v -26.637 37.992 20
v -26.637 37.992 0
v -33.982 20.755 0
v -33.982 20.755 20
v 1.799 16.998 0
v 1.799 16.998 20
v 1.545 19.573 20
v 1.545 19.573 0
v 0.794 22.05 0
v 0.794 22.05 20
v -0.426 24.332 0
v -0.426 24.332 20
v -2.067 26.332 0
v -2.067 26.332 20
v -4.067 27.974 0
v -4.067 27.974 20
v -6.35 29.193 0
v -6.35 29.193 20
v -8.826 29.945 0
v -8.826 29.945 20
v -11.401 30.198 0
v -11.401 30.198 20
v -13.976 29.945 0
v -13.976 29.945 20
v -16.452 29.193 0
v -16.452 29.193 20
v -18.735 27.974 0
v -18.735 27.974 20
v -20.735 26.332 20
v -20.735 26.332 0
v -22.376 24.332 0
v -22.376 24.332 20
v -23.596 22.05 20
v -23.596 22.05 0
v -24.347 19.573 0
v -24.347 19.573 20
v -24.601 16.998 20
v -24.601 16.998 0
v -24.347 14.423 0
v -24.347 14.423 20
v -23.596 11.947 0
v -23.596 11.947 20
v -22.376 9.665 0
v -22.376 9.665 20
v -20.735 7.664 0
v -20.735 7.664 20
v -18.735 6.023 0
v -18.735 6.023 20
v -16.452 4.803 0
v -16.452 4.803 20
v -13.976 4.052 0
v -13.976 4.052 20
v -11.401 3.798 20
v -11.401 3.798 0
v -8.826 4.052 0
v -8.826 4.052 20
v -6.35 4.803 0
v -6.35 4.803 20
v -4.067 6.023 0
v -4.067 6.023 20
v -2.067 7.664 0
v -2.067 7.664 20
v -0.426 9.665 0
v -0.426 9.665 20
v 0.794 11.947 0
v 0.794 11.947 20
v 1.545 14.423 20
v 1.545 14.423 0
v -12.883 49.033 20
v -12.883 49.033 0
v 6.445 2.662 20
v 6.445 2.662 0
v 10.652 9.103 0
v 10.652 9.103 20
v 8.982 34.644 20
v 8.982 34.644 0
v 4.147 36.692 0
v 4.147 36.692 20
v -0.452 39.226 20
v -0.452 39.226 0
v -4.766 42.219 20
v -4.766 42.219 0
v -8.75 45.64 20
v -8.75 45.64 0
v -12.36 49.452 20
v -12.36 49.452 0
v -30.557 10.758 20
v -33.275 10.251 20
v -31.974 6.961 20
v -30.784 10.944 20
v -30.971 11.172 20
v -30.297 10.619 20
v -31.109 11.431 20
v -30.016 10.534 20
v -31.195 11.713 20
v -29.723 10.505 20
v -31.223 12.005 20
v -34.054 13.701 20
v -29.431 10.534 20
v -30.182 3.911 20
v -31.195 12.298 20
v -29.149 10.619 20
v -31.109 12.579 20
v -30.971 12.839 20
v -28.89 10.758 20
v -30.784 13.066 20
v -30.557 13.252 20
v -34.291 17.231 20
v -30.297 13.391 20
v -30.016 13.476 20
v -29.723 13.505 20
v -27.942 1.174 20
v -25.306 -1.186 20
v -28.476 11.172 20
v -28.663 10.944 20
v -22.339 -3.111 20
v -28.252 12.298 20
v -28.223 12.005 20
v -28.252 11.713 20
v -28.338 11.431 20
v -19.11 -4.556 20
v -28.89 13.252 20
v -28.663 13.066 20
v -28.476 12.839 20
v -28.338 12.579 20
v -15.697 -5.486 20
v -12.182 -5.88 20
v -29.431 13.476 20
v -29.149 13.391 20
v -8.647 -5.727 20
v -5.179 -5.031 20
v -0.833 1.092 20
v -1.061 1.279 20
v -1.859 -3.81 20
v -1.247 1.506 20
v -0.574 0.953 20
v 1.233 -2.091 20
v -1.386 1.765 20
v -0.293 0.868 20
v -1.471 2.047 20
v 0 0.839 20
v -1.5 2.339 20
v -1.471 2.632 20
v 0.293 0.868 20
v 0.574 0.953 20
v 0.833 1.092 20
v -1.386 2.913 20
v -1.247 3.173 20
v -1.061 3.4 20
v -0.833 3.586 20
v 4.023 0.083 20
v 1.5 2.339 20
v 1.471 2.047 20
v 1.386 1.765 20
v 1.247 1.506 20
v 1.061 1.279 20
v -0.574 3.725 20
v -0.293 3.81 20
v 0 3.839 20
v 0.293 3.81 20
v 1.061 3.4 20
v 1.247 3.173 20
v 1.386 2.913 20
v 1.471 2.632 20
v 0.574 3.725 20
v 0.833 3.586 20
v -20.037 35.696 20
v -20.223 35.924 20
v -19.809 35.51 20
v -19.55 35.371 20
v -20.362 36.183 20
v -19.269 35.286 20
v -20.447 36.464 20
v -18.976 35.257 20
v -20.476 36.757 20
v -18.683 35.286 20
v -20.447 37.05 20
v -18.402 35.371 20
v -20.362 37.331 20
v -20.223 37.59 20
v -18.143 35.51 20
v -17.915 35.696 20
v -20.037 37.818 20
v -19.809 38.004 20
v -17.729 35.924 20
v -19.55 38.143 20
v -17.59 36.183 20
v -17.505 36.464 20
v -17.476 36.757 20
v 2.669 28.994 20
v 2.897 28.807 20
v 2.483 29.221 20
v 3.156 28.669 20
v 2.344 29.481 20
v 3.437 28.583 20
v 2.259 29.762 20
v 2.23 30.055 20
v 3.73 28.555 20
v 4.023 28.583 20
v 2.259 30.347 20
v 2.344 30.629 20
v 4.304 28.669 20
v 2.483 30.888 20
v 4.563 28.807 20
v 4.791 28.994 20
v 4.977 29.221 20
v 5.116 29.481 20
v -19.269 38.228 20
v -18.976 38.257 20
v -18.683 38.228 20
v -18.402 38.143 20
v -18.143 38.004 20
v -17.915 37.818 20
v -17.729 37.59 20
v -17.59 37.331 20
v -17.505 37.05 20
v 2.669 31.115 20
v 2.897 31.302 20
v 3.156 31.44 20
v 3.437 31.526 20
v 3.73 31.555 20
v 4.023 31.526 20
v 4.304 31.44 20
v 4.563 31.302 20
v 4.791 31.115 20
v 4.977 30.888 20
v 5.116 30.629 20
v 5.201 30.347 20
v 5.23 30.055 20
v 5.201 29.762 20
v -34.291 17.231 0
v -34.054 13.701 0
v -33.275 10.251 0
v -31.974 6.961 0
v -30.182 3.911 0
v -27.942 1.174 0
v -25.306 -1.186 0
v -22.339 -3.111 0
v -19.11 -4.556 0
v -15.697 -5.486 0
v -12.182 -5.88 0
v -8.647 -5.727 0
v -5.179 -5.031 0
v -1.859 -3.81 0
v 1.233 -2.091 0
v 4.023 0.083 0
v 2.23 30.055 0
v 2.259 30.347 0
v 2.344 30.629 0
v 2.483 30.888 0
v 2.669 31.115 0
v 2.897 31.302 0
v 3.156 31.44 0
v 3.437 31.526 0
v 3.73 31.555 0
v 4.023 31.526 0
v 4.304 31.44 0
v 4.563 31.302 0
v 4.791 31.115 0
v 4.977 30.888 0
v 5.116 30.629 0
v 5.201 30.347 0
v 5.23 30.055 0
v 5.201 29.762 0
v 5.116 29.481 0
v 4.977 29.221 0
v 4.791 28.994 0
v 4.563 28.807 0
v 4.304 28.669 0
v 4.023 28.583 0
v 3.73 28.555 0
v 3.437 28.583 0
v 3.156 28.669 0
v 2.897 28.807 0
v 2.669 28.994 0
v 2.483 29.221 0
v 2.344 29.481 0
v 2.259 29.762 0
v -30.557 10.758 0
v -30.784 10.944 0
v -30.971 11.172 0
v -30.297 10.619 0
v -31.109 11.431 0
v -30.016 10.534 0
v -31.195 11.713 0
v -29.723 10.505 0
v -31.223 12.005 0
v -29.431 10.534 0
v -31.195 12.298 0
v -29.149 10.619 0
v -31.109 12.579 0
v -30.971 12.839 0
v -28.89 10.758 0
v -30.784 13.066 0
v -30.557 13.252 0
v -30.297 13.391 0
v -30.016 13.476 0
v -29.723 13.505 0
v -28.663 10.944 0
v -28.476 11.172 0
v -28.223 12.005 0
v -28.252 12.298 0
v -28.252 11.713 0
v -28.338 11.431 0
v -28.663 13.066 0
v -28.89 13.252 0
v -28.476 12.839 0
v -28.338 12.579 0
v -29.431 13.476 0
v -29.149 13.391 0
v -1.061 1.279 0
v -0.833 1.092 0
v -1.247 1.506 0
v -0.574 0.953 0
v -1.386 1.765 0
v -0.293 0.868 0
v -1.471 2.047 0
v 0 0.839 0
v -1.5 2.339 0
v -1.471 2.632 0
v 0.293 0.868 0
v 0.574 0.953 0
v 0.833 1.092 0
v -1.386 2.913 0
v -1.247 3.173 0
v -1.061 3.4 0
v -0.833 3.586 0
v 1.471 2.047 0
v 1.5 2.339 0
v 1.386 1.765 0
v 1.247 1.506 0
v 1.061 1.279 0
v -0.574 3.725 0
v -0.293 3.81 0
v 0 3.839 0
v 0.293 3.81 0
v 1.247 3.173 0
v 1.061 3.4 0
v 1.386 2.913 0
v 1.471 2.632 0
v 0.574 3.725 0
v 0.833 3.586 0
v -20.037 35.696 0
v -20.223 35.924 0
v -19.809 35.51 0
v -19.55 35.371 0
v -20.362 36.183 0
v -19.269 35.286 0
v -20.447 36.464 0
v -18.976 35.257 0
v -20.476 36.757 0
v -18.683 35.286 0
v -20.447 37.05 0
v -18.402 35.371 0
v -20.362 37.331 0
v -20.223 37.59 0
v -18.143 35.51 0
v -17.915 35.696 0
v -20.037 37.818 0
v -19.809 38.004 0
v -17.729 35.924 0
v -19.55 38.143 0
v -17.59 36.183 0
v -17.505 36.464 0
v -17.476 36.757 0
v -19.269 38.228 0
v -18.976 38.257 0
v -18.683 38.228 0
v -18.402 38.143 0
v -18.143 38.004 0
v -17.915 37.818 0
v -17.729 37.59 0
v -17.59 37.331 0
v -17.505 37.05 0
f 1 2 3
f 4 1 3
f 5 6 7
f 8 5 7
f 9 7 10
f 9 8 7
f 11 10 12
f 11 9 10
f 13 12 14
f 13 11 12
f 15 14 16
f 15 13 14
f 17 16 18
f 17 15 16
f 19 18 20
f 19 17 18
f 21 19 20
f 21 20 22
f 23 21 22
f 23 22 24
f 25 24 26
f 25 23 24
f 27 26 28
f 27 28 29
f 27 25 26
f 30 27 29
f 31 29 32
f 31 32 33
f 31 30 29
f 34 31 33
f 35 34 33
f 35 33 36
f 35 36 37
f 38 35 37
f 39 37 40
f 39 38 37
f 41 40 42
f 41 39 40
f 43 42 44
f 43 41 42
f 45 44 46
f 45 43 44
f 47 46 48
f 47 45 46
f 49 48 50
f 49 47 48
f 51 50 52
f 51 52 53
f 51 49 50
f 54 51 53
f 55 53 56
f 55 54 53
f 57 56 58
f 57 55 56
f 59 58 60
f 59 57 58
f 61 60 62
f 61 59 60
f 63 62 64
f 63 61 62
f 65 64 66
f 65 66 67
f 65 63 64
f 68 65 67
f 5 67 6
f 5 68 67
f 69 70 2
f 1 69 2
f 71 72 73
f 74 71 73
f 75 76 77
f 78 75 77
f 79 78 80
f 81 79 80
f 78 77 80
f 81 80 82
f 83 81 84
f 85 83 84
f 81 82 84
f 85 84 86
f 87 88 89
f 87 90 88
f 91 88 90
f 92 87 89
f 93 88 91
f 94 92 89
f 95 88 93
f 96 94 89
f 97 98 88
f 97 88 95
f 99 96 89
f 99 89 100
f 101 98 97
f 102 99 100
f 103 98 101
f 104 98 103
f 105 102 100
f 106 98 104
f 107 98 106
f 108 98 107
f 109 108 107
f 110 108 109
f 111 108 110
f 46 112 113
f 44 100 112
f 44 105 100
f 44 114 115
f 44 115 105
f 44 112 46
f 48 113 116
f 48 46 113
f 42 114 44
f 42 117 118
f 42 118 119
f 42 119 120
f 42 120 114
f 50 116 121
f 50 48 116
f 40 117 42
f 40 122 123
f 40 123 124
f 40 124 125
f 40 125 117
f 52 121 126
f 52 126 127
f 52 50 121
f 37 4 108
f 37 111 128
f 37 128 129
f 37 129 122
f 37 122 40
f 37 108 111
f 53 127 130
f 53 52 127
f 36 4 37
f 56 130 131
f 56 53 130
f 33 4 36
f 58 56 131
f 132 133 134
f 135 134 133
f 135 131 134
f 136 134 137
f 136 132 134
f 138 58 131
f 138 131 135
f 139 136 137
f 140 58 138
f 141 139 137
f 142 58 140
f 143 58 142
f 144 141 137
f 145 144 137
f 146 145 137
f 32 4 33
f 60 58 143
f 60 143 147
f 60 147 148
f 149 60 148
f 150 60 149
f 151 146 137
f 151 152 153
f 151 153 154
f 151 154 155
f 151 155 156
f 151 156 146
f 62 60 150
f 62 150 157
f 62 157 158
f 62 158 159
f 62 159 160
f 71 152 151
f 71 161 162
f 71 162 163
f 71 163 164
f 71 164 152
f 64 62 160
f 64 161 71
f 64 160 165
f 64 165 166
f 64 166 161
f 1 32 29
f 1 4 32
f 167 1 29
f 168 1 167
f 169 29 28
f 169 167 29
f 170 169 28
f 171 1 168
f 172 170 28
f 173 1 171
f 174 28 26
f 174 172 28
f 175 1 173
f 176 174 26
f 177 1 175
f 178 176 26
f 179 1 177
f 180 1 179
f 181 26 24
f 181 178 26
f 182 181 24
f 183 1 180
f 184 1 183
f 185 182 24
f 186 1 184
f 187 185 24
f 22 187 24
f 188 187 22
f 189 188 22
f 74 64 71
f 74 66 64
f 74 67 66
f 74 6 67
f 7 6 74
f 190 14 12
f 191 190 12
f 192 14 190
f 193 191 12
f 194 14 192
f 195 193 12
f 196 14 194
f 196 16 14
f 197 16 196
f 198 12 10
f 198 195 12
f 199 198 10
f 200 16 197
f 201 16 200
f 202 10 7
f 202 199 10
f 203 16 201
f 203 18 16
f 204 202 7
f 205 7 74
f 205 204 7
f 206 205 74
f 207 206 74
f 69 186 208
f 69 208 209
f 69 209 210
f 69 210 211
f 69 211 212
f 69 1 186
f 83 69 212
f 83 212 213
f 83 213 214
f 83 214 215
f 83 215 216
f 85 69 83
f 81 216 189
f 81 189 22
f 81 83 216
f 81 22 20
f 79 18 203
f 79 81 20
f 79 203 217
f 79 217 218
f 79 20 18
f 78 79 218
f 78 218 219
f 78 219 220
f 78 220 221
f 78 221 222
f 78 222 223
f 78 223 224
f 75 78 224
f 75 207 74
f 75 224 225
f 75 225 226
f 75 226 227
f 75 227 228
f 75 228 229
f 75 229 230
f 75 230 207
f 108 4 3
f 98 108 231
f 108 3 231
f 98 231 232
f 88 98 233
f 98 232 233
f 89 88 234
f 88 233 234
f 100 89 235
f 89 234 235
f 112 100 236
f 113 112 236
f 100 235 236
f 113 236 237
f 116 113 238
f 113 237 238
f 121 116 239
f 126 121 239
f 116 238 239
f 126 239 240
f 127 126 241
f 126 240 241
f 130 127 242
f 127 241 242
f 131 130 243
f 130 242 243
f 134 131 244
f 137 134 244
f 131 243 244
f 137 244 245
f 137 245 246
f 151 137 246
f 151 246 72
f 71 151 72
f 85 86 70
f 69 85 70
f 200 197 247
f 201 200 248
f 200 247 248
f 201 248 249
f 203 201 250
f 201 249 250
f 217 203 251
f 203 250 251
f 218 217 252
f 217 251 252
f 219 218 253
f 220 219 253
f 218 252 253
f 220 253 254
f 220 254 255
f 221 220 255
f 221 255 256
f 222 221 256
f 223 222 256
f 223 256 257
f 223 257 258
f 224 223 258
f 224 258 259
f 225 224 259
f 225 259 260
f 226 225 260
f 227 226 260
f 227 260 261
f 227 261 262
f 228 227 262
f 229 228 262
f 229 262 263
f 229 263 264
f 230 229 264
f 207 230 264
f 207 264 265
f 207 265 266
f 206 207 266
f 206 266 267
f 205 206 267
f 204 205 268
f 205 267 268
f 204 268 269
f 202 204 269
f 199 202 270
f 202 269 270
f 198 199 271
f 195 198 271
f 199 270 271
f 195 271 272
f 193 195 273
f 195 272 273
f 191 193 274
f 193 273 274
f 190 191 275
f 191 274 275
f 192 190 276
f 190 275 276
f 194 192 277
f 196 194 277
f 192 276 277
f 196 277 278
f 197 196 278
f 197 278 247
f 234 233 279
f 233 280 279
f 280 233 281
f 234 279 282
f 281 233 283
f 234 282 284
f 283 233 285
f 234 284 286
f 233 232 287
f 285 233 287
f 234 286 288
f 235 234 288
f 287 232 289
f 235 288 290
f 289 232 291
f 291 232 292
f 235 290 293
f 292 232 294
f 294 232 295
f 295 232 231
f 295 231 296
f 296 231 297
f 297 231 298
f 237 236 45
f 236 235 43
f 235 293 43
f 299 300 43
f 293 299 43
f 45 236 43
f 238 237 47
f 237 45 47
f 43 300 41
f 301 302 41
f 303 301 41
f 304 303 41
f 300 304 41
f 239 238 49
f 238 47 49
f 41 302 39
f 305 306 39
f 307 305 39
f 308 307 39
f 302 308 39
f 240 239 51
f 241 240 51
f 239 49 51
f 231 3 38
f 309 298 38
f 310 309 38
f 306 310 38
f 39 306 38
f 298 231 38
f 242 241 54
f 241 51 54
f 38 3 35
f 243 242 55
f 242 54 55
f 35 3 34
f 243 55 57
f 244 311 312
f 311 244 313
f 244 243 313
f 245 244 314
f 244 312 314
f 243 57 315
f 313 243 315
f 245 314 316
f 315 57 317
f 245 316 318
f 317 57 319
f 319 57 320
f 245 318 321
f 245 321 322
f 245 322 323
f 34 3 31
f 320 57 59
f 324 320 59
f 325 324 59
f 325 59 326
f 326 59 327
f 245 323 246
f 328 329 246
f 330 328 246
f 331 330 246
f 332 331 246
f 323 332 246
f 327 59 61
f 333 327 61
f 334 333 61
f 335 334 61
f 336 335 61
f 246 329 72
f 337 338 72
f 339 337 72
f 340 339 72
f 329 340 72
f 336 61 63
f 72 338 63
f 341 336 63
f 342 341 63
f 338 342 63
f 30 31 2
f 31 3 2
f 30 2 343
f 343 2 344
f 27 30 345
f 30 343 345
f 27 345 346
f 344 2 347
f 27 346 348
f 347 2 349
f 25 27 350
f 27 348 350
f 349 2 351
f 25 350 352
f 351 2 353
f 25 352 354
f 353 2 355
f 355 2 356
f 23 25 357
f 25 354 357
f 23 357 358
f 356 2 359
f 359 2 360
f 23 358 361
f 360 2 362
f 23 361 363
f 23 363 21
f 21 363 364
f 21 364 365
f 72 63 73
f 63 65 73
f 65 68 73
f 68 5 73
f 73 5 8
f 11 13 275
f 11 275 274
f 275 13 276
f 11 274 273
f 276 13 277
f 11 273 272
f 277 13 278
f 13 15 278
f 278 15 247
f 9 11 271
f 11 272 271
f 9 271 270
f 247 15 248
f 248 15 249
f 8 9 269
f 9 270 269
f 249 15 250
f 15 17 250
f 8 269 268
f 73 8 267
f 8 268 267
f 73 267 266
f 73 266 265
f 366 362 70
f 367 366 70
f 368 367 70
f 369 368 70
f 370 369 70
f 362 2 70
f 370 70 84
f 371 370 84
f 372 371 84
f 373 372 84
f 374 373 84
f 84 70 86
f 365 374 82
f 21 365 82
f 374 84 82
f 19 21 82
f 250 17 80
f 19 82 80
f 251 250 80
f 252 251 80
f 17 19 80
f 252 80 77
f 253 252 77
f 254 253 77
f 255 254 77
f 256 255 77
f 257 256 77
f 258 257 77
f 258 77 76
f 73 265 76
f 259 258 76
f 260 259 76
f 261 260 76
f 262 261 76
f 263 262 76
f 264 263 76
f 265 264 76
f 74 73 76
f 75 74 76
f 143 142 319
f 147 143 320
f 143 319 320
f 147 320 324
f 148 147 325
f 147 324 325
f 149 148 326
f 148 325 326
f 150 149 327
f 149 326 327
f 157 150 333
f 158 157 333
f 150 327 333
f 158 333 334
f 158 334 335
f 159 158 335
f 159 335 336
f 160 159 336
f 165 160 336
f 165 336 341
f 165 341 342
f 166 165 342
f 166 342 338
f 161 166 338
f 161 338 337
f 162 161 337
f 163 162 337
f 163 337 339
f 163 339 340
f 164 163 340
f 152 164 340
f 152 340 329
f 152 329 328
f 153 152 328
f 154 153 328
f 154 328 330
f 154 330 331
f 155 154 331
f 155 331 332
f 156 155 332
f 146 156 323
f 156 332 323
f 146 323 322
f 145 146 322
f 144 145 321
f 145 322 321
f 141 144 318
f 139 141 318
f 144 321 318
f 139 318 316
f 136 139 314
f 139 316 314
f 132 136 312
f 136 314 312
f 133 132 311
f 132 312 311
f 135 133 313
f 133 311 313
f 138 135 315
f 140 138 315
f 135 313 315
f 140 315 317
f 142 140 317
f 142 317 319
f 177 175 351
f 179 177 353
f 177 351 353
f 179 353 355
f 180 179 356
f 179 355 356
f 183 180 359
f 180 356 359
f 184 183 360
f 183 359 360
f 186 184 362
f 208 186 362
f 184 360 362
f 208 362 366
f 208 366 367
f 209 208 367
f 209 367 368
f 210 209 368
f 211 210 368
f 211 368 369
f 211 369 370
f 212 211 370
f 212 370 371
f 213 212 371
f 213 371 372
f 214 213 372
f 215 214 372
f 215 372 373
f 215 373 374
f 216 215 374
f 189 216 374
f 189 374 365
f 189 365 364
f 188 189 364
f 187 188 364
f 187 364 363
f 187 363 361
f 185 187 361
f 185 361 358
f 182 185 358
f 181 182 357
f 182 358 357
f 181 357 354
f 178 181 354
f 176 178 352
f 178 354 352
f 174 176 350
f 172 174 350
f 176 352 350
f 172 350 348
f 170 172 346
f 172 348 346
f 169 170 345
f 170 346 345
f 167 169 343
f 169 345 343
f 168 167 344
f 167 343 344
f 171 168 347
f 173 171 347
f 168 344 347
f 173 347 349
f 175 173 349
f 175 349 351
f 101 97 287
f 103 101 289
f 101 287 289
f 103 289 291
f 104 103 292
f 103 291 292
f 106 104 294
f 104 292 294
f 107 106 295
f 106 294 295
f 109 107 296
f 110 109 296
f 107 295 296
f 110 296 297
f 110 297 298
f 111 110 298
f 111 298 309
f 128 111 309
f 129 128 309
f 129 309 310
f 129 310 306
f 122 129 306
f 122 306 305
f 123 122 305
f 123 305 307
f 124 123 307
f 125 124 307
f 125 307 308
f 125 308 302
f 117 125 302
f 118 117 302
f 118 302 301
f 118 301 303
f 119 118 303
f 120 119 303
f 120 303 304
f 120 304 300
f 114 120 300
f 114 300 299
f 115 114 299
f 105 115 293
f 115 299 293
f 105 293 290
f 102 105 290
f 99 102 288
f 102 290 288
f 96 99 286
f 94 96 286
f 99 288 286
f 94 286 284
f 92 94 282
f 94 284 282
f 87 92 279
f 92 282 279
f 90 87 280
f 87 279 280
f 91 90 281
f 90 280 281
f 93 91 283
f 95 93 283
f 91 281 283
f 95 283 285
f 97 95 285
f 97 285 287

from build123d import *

# Parameters (mm, degrees)
SKETCH_1_R         = 13.2
EXTRUDE_1_DEPTH    = 20
SKETCH1_R          = 1.5
CUT_EXTRUDE1_DEPTH = 64.415064914


with BuildPart() as part:
    # 草图1 → 凸台-拉伸1 (new body)
    with BuildSketch(Plane.XY):
        with BuildLine():
            Line((-26.636659375, 37.991533435), (-33.982028451, 20.754703285))
            ThreePointArc((-33.982028451, 20.754703285), (-20.752268235, -3.895931787), (6.444792613, 2.661525501))
            Line((6.444792613, 2.661525501), (10.6520193, 9.103214753))
            Line((10.6520193, 9.103214753), (8.9820702, 34.644311807))
            ThreePointArc((8.9820702, 34.644311807), (-2.647754906, 40.666580897), (-12.360428284, 49.452053726))
            Line((-12.360428284, 49.452053726), (-12.882509975, 49.032942563))
            Line((-12.882509975, 49.032942563), (-26.636659375, 37.991533435))
        make_face()
        with Locations((-11.400988001, 16.998271389)):
            Circle(SKETCH_1_R, mode=Mode.SUBTRACT)
    extrude(amount=EXTRUDE_1_DEPTH)

    # Sketch1 → Cut-Extrude1 (cut, through all)
    with BuildSketch(Plane(origin=(0, 0, 0), x_dir=(-1, 0, 0), z_dir=(0, 0, -1))):
        with Locations((-3.729872433, 30.054548194)):
            Circle(SKETCH1_R)
        with Locations((-311.403264346, -148.702528504)):
            Circle(SKETCH1_R)
        with Locations((18.975895674, 36.756893457)):
            Circle(SKETCH1_R)
        with Locations((29.72343959, 12.005147937)):
            Circle(SKETCH1_R)
        with Locations((0, 2.339279114)):
            Circle(SKETCH1_R)
    extrude(amount=-CUT_EXTRUDE1_DEPTH, mode=Mode.SUBTRACT)


solid = part.part
